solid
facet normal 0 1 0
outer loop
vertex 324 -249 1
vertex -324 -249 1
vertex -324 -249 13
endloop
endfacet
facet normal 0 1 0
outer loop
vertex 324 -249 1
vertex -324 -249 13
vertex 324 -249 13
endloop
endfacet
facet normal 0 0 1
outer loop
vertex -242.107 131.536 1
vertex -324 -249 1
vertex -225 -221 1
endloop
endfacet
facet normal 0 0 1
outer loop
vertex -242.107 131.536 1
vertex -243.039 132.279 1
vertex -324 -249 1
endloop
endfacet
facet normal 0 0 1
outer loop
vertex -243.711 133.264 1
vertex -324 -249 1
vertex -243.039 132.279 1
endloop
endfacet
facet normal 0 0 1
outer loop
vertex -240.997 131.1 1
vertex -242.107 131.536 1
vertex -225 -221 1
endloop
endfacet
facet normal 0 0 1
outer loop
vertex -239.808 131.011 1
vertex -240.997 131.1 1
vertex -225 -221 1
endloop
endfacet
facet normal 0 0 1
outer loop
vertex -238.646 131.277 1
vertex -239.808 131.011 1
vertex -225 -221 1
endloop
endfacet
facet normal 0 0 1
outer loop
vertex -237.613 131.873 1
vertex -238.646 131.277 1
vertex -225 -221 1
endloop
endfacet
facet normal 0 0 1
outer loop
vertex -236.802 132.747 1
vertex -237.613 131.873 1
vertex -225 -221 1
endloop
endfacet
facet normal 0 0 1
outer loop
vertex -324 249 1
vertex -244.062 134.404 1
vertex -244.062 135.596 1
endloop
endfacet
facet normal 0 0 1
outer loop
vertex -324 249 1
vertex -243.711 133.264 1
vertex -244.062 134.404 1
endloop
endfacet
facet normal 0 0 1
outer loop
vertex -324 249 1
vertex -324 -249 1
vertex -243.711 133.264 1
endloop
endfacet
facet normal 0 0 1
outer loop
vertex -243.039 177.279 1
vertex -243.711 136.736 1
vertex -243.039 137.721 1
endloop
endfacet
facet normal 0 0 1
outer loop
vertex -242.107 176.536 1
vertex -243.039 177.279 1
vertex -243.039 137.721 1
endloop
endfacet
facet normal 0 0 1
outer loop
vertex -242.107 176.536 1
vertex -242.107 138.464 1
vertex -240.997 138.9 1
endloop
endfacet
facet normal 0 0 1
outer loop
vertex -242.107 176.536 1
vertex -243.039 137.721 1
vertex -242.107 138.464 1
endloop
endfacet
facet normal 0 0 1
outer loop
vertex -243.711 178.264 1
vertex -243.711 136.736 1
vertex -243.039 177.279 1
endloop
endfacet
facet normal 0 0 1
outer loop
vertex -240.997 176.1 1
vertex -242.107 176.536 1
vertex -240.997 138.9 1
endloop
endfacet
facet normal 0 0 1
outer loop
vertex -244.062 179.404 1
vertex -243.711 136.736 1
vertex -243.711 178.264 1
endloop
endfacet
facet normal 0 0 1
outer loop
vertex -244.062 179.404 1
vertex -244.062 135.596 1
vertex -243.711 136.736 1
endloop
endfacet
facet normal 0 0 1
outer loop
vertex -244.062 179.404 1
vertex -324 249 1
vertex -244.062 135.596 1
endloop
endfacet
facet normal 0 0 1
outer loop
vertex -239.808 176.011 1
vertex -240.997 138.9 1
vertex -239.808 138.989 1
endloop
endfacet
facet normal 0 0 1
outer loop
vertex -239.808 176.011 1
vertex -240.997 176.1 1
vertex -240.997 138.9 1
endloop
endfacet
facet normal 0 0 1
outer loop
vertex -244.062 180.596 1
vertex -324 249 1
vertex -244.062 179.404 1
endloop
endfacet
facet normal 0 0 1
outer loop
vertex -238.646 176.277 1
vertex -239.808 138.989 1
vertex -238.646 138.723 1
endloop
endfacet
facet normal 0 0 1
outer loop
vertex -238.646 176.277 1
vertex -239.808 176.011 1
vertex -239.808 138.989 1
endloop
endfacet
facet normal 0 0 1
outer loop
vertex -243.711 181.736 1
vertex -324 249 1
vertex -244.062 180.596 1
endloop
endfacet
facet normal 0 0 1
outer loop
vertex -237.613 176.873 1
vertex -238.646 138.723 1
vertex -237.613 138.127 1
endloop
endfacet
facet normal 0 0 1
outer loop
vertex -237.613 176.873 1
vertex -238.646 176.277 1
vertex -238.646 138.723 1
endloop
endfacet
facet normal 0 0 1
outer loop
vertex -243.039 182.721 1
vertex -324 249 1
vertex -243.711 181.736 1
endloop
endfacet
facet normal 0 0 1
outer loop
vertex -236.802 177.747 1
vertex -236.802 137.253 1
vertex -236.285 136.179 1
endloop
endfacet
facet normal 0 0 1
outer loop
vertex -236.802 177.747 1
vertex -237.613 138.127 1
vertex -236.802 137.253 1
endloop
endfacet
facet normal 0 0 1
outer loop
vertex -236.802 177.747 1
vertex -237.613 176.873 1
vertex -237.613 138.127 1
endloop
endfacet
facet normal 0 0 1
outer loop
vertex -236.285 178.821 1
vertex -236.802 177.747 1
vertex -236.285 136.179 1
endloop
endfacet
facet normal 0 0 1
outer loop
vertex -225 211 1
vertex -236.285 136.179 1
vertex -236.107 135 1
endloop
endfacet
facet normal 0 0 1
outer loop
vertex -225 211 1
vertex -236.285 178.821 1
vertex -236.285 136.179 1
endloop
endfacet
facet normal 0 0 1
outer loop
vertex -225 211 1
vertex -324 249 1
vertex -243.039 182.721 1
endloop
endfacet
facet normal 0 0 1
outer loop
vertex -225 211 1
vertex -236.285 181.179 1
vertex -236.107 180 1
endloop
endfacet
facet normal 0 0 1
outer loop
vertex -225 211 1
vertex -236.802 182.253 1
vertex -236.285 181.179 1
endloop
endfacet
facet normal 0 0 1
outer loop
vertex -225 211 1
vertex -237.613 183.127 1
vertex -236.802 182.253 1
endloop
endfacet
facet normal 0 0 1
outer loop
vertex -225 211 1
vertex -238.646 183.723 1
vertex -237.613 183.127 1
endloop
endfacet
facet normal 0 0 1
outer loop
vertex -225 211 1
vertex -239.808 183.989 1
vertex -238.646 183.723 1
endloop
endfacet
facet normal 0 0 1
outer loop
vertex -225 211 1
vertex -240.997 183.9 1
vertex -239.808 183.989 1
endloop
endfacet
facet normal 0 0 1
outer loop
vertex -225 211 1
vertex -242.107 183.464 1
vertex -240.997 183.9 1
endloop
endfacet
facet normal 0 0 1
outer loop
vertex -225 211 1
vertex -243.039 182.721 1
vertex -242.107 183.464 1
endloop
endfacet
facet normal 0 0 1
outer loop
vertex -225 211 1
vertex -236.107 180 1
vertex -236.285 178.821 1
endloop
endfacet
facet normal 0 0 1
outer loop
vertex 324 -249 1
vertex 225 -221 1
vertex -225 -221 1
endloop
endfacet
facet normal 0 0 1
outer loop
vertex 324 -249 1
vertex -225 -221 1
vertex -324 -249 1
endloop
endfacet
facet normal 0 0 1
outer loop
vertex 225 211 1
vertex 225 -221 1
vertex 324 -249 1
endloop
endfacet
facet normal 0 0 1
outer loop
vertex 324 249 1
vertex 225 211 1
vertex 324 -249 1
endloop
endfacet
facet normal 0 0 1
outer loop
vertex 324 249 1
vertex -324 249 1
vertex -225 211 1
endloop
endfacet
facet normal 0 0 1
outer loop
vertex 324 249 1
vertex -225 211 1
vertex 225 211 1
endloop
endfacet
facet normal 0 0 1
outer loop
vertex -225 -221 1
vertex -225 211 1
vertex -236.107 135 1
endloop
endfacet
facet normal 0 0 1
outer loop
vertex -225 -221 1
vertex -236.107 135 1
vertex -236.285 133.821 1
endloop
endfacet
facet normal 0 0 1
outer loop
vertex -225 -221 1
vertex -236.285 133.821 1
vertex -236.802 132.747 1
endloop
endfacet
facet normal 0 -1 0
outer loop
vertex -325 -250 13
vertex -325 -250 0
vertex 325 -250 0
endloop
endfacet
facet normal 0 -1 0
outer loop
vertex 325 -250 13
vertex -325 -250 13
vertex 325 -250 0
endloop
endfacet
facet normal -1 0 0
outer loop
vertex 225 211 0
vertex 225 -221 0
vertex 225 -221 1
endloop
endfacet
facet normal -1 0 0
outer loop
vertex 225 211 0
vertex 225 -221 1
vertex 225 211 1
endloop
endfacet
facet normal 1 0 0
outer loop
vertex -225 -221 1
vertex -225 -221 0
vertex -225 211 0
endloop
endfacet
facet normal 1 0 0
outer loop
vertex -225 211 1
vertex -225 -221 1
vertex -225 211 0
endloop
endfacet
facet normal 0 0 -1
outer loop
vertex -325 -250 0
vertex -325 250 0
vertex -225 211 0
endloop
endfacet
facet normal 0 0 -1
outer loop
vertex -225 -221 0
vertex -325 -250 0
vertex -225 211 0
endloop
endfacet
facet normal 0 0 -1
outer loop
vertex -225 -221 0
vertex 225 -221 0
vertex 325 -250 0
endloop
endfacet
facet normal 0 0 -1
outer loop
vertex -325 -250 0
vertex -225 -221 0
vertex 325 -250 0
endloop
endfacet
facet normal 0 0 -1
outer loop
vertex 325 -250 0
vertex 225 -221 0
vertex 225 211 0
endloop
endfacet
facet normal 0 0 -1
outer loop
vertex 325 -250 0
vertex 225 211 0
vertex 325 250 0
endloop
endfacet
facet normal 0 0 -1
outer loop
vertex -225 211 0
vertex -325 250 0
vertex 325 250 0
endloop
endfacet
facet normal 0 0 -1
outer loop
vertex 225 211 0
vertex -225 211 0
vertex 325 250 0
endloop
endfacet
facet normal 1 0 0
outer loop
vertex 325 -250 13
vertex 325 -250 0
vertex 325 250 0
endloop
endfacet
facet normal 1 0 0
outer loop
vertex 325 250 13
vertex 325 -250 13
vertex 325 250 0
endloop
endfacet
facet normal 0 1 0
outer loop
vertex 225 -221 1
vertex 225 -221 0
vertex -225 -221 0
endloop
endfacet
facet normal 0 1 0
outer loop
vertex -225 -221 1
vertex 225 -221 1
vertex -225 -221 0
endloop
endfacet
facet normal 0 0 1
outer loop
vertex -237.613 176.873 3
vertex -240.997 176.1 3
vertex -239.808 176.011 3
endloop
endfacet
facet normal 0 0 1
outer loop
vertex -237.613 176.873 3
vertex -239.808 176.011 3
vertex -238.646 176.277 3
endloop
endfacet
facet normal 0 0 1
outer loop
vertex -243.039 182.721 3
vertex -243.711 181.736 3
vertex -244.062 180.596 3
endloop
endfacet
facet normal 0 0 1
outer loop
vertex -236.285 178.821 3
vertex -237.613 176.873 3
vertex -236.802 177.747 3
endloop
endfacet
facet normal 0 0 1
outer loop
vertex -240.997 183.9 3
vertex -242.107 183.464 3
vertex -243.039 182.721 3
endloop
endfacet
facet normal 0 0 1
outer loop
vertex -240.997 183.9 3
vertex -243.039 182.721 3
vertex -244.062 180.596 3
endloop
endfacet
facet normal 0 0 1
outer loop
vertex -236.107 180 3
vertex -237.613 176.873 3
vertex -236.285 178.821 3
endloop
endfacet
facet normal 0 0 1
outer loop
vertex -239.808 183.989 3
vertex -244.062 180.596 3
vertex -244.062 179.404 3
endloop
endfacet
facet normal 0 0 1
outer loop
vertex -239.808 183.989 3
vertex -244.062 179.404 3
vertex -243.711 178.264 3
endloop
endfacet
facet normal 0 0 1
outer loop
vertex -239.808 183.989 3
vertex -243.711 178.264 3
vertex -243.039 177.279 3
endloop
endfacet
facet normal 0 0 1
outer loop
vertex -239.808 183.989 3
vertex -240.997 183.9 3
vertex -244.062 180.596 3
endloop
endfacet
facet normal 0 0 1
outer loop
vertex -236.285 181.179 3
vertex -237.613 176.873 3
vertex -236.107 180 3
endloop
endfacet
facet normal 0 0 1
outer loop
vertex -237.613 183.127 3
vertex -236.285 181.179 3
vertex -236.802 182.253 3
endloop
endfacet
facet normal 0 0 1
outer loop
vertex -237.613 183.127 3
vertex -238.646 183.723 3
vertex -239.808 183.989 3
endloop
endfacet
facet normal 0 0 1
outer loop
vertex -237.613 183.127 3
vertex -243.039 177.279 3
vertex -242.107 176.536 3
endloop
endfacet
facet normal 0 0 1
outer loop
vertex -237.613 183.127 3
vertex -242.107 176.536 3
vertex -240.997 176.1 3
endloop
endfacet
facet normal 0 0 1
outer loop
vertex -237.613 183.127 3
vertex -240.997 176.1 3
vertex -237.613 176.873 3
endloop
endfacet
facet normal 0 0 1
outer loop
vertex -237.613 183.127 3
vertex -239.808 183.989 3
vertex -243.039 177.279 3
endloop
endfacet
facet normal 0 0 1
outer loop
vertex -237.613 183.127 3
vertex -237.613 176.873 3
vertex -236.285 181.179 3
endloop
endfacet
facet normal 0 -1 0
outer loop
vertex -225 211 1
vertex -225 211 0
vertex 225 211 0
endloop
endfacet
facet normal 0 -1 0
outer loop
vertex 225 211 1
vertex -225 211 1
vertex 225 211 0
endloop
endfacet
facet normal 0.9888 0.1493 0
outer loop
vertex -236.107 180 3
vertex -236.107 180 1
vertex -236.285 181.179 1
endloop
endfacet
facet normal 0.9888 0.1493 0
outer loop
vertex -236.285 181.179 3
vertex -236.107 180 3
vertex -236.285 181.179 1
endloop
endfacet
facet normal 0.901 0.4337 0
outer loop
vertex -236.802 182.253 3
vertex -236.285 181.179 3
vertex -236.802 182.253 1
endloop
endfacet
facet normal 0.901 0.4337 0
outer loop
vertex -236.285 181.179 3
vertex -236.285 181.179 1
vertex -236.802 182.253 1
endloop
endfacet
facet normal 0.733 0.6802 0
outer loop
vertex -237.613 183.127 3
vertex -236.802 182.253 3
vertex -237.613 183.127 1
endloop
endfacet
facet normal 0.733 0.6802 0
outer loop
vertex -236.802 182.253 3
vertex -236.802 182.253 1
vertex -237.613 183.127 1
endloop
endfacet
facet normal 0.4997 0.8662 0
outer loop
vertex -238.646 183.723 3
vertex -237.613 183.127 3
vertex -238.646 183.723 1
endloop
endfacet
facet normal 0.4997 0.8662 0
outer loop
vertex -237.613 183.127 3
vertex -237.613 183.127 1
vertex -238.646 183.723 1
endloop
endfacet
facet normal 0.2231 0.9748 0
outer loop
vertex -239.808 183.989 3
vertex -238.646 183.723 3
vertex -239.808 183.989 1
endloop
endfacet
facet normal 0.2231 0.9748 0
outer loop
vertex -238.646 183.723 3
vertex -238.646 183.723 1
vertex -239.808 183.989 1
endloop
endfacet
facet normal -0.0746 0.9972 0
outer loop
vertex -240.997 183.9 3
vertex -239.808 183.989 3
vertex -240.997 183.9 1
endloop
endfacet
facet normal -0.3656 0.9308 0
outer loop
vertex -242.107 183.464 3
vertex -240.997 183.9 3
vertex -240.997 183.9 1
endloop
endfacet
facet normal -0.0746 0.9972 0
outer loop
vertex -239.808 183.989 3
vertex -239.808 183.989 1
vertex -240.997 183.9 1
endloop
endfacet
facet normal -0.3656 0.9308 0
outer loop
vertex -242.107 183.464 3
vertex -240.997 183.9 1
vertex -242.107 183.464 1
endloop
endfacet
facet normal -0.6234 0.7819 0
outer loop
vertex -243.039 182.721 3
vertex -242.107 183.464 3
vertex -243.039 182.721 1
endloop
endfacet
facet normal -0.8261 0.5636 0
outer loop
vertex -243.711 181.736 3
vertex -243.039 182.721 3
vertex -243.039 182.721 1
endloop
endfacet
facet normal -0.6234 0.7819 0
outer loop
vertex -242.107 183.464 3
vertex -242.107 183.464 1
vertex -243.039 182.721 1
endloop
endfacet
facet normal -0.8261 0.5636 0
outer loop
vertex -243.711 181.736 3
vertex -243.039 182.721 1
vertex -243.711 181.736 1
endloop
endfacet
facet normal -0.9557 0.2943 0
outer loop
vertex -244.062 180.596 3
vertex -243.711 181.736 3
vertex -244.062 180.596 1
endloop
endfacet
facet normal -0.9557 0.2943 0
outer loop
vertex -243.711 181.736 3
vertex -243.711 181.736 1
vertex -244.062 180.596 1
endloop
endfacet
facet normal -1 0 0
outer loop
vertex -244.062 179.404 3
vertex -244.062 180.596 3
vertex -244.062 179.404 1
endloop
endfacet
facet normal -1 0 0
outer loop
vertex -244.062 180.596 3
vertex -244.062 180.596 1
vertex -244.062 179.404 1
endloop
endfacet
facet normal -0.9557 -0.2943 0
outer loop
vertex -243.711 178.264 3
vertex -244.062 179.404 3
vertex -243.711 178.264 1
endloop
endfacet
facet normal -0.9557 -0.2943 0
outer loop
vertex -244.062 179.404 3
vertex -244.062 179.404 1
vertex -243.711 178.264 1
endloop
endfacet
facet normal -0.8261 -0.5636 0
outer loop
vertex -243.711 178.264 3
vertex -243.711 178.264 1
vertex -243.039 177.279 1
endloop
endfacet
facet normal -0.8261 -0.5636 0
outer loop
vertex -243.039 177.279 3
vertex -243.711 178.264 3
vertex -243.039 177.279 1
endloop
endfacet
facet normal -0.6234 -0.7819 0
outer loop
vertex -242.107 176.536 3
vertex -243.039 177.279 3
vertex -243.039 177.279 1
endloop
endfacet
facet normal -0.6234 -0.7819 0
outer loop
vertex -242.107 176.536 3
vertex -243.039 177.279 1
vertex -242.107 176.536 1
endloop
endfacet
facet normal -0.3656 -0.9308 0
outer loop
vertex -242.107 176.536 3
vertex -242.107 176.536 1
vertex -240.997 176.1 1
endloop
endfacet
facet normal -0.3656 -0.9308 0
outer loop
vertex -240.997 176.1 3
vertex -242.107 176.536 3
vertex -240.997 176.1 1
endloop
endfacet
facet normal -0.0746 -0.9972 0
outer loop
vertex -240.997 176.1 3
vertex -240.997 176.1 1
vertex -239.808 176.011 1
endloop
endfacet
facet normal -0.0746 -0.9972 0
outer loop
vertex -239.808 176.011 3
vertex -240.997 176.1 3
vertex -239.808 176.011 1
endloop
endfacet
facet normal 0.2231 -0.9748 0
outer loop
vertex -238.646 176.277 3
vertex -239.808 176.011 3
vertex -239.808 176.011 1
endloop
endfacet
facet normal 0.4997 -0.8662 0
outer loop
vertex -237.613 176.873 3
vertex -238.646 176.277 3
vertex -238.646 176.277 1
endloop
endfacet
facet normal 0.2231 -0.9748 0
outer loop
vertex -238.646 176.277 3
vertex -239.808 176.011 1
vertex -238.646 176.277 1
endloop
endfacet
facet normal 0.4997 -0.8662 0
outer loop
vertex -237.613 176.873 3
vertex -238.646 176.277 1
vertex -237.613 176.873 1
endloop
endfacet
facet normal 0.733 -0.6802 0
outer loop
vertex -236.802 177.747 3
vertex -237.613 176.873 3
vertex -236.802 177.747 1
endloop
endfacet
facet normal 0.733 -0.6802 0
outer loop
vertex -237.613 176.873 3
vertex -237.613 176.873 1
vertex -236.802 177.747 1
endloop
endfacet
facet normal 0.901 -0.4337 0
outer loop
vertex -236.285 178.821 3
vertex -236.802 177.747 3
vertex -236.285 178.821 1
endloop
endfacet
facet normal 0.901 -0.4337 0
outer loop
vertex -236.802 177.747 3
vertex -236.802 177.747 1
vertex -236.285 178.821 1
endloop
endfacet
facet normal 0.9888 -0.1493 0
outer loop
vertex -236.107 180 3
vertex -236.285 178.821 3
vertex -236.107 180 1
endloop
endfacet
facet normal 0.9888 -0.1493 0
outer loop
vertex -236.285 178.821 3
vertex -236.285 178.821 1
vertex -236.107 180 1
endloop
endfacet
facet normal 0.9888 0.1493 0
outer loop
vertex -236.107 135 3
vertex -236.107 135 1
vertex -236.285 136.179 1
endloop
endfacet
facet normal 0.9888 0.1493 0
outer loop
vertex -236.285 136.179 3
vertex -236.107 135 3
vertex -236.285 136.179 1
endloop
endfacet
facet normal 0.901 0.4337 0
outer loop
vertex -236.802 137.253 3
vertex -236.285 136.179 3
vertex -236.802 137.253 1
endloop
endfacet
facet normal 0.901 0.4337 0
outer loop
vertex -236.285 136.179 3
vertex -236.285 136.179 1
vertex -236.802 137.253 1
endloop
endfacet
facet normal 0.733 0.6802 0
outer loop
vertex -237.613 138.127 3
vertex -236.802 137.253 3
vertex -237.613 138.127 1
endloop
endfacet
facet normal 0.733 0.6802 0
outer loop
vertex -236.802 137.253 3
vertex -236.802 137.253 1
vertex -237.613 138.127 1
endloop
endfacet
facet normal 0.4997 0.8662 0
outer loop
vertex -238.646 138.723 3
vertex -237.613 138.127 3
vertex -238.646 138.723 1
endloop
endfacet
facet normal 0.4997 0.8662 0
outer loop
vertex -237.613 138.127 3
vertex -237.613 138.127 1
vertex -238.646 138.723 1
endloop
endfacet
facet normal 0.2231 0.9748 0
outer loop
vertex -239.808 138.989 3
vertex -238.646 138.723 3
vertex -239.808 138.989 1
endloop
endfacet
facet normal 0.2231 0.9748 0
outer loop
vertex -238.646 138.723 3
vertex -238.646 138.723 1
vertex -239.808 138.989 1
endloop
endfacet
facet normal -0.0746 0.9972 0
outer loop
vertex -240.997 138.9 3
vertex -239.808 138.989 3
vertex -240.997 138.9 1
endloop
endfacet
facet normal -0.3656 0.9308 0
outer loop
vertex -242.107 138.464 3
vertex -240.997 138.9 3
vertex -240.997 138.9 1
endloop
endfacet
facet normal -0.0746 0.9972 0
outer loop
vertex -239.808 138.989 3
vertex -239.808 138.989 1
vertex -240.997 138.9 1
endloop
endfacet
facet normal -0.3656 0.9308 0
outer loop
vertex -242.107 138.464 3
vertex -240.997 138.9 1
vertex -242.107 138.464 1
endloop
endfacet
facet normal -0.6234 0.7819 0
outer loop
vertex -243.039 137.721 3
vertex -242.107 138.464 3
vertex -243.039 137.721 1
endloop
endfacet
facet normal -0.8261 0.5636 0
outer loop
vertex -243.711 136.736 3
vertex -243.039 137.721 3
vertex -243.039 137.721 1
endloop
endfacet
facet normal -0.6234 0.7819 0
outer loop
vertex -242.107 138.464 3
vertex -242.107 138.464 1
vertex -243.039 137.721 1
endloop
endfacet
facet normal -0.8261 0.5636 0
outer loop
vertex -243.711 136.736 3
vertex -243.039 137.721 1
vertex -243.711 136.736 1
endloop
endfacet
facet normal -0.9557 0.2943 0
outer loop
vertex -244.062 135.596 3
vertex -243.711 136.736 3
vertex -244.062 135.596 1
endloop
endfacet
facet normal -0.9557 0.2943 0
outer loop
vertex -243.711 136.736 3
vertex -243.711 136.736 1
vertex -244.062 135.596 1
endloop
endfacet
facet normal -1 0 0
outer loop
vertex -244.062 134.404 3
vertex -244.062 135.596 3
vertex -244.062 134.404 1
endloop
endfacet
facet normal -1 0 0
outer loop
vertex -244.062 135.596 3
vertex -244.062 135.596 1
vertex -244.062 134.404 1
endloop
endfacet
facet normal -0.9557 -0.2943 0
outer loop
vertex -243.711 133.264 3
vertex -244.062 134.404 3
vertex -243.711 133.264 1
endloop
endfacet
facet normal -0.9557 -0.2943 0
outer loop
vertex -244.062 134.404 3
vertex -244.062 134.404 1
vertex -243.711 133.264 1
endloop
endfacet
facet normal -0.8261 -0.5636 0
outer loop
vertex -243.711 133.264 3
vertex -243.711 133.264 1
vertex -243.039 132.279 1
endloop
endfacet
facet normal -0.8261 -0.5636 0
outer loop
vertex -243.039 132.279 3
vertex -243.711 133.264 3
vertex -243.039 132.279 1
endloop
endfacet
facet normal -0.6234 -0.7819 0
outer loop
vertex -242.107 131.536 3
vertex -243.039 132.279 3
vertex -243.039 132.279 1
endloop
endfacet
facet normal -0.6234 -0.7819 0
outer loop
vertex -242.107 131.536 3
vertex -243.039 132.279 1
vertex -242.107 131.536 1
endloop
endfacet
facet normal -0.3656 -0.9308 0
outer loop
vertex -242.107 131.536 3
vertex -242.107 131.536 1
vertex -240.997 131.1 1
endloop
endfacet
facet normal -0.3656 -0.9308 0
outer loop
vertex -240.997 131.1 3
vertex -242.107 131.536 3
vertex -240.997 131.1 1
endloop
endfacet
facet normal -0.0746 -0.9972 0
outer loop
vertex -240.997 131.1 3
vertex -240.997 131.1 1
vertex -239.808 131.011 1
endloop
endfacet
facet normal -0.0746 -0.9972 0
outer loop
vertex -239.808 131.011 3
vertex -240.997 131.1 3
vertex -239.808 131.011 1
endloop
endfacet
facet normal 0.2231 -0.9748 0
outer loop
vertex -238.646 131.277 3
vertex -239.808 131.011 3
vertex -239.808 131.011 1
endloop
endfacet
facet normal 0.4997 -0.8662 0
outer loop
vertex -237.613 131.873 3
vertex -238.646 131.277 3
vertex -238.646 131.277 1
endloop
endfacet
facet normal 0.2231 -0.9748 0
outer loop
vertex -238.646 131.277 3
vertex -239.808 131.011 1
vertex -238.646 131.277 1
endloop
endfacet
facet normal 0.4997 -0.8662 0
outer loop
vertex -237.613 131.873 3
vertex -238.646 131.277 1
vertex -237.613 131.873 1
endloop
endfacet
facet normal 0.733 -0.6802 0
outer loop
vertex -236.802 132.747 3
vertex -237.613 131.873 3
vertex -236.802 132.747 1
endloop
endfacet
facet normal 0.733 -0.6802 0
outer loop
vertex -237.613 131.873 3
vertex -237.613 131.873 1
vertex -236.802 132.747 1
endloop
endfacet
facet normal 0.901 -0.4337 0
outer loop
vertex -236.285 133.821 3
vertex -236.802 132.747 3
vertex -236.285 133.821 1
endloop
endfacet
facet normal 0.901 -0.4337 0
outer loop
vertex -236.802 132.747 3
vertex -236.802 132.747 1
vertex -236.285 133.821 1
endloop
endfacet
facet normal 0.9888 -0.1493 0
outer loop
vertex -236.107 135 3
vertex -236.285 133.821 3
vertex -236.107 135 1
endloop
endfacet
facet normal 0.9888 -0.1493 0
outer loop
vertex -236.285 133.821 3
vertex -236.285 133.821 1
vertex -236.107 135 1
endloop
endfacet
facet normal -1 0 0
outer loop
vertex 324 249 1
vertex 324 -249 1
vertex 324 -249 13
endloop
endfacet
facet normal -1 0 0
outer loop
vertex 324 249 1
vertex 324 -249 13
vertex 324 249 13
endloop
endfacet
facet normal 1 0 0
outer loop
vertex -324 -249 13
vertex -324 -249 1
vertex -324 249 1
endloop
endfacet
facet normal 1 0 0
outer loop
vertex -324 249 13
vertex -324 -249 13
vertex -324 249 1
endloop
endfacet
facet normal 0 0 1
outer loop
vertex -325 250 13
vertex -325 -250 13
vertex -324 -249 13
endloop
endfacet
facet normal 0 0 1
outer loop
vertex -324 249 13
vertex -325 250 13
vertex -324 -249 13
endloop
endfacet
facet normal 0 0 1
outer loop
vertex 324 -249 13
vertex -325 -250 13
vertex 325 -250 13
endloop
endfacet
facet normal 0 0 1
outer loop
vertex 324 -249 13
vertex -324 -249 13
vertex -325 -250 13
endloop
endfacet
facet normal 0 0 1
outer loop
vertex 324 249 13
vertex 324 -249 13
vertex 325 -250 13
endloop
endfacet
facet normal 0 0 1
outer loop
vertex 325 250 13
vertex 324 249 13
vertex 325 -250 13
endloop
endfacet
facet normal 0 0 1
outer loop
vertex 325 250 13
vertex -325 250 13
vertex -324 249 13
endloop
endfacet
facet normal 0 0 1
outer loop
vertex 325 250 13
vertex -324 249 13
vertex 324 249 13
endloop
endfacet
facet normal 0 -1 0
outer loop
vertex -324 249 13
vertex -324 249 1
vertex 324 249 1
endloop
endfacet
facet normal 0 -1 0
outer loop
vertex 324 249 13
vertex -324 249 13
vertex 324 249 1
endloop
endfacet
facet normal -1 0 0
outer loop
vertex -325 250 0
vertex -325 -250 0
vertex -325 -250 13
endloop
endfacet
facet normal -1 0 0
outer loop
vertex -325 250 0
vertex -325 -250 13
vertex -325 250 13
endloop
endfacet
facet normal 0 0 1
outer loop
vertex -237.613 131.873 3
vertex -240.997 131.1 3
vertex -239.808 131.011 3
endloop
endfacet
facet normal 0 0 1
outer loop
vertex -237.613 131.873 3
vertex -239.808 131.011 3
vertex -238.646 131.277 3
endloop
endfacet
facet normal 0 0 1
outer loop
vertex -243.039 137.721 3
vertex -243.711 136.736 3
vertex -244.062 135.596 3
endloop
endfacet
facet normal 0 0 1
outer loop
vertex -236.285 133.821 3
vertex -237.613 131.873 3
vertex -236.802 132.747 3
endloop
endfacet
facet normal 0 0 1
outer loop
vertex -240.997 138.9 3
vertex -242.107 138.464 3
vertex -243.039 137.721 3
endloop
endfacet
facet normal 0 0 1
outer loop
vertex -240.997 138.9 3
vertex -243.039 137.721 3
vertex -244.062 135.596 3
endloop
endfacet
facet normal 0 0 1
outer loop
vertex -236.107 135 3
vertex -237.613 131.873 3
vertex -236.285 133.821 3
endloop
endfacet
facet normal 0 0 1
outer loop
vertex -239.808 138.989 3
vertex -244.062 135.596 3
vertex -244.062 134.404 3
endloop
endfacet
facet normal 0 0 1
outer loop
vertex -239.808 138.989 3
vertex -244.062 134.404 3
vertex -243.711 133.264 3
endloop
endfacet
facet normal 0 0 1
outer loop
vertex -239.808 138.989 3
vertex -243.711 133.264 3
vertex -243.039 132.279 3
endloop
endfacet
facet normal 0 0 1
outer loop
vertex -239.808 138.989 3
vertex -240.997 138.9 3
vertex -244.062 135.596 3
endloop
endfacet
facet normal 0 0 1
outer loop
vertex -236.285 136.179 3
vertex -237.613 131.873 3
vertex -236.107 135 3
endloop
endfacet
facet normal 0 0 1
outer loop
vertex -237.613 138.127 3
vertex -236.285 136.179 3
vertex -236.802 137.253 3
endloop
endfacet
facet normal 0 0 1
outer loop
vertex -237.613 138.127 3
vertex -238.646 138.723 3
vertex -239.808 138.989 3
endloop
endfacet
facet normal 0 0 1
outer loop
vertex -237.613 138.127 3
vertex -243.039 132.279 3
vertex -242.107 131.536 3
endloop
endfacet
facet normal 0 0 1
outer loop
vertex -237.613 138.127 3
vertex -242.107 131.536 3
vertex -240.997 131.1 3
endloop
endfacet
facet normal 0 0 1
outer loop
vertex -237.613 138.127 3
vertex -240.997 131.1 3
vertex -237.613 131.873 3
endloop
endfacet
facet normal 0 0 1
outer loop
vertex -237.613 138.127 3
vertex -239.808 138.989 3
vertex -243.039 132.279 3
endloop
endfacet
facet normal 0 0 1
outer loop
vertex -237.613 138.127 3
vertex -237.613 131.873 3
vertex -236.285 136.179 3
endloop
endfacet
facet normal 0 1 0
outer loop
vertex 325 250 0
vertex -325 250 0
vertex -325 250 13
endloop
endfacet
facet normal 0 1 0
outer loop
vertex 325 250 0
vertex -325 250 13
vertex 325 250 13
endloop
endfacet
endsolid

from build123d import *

# Parameters (mm, degrees)
SKETCH1_W           = 650
SKETCH1_H           = 500
SKETCH1_W_2         = 450
SKETCH1_H_2         = 422
BOSS_EXTRUDE1_DEPTH = 13
SKETCH2_W           = 450
SKETCH2_H           = 10
CUT_EXTRUDE1_DEPTH  = 13
SHELL1_T            = -1
SKETCH3_R           = 4
BOSS_EXTRUDE2_DEPTH = 2
LPATTERN1_COUNT     = 2
LPATTERN1_PITCH     = 45


with BuildPart() as part:
    # Sketch1 → Boss-Extrude1 (new body)
    with BuildSketch(Plane.XY):
        Rectangle(SKETCH1_W, SKETCH1_H)
        Rectangle(SKETCH1_W_2, SKETCH1_H_2, mode=Mode.SUBTRACT)
    extrude(amount=BOSS_EXTRUDE1_DEPTH)

    # Sketch2 → Cut-Extrude1 (cut)
    with BuildSketch(Plane(origin=(0, 0, 0), x_dir=(-1, 0, 0), z_dir=(0, 0, -1))):
        with Locations((0, -216)):
            Rectangle(SKETCH2_W, SKETCH2_H)
    extrude(amount=-CUT_EXTRUDE1_DEPTH, mode=Mode.SUBTRACT)

    # Shell1
    shell1_openings = [part.faces().sort_by_distance(p)[0] for p in [
        (0, -241.799390267, 13),
        (-225, -5, 6.5),
        (225, -5, 6.5),
        (0, 211, 6.5),
        (0, -221, 6.5),
    ]]
    offset(amount=SHELL1_T, openings=shell1_openings, kind=Kind.INTERSECTION)

    # Sketch3 → Boss-Extrude2 (add)
    with BuildSketch(Plane.XY.offset(1)):
        with Locations((-240.106920594, 180)):
            Circle(SKETCH3_R)
    boss_extrude2 = extrude(amount=BOSS_EXTRUDE2_DEPTH)

    # LPattern1: Boss-Extrude2 ×2
    with Locations(*[(0, -i * LPATTERN1_PITCH, 0) for i in range(1, LPATTERN1_COUNT)]):
        add(boss_extrude2)


solid = part.part
